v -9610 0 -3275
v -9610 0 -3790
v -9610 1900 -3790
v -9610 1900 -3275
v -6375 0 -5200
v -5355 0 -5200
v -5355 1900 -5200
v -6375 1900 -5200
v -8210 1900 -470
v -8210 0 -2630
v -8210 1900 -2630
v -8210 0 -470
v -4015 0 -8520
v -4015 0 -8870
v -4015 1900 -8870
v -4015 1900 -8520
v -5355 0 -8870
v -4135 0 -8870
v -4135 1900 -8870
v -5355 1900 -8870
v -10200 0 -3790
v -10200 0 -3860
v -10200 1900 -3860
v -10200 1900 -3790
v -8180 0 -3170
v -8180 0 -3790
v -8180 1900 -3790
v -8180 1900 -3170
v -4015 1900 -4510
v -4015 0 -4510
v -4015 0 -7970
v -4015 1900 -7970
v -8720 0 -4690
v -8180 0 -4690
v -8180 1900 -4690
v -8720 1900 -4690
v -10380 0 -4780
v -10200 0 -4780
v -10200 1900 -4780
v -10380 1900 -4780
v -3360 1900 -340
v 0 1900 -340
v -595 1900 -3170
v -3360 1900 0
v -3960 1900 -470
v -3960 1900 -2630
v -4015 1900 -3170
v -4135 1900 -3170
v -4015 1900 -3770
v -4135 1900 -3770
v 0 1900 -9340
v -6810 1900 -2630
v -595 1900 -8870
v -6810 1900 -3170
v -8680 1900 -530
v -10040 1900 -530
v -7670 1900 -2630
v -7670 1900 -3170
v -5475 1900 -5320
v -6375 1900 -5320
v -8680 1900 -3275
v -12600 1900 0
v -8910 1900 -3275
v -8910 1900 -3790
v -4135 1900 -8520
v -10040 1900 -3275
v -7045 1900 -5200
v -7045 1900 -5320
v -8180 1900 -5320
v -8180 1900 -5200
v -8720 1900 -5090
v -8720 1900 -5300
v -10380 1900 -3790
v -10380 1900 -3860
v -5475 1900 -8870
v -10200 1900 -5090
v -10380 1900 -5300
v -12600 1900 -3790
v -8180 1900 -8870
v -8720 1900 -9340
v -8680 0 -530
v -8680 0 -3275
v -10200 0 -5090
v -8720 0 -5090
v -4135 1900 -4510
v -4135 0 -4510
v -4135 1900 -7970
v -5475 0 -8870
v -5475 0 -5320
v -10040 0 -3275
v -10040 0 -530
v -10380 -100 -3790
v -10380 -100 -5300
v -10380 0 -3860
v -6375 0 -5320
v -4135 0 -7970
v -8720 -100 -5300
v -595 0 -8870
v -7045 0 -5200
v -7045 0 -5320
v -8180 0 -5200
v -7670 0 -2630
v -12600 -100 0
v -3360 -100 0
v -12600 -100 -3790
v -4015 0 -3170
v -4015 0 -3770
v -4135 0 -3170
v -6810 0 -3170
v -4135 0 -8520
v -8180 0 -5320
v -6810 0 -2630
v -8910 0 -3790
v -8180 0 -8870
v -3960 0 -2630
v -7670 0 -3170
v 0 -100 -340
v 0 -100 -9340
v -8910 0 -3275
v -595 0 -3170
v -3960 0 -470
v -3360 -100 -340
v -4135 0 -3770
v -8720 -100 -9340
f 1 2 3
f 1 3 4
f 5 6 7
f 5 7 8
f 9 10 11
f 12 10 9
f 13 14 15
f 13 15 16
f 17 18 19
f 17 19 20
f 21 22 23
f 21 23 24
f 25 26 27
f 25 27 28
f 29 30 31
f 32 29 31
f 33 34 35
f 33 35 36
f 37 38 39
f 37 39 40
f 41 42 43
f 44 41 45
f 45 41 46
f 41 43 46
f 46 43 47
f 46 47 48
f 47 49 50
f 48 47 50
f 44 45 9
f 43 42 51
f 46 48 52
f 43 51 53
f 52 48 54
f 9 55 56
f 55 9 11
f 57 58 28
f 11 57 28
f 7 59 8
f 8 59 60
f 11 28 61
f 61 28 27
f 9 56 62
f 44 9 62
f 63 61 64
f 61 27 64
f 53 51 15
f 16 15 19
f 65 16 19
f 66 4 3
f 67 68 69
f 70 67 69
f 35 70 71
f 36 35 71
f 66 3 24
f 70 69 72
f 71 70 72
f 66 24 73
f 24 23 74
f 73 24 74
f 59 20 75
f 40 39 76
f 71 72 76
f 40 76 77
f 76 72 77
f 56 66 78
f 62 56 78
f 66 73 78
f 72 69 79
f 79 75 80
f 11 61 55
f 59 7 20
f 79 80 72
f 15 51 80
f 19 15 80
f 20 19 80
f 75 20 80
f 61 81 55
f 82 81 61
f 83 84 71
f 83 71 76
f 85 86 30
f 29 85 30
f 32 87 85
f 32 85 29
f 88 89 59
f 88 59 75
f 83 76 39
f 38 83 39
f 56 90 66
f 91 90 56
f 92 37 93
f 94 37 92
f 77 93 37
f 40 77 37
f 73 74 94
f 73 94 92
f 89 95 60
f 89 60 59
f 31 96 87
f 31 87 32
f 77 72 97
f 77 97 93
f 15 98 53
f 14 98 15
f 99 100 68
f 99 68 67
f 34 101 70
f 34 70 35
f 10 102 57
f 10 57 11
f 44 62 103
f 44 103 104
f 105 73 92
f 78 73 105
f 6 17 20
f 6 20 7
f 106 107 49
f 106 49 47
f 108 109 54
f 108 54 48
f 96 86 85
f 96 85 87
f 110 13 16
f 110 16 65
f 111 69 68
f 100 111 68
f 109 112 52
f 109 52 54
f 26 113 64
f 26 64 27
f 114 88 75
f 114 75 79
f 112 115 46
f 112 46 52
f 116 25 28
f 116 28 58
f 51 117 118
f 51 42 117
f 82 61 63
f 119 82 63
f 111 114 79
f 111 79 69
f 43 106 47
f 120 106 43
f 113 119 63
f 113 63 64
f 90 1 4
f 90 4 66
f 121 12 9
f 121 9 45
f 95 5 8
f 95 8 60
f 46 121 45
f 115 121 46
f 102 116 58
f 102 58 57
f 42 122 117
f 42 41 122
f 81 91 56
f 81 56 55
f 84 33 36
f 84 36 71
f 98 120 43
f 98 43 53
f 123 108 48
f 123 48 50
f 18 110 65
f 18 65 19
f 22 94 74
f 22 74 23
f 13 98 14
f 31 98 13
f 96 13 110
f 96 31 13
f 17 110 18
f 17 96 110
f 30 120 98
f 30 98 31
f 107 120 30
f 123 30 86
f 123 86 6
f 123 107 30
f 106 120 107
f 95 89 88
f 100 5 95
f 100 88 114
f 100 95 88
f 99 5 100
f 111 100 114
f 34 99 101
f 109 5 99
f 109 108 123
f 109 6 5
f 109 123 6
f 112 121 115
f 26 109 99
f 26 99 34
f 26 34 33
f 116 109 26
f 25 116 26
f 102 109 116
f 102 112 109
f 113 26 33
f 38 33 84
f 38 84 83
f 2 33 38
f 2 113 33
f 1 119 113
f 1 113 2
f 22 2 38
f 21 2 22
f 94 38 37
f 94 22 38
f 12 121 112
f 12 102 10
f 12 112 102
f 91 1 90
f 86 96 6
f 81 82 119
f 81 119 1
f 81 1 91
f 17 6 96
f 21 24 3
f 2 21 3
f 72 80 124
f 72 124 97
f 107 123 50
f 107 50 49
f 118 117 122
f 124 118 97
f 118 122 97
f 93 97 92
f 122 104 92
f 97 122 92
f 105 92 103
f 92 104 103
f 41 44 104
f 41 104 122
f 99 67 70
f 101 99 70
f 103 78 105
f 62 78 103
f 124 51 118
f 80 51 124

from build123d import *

# Parameters (mm, degrees)
EXTRUDE_1_DEPTH   = 1900
SKETCH_1_W        = 120
SKETCH_1_H        = 3460
EXTRUDE_1_2_DEPTH = 1900
EXTRUDE_2_DEPTH   = 100


with BuildPart() as part:
    # Эскиз1 → Бобышка-Вытянуть1 (new body)
    with BuildSketch(Plane(origin=(0, 0, 0), x_dir=(1, 0, 0), z_dir=(0, 1, 0))):
        Polygon((-12600, 0), (-12600, 3790), (-10380, 3790), (-10380, 3860), (-10200, 3860), (-10200, 3790), (-9610, 3790), (-9610, 3275), (-10040, 3275), (-10040, 530), (-8680, 530), (-8680, 3275), (-8910, 3275), (-8910, 3790), (-8180, 3790), (-8180, 3170), (-7670, 3170), (-7670, 2630), (-8210, 2630), (-8210, 470), (-3960, 470), (-3960, 2630), (-6810, 2630), (-6810, 3170), (-4135, 3170), (-4135, 3770), (-4015, 3770), (-4015, 3170), (-595, 3170), (-595, 8870), (-4015, 8870), (-4015, 8520), (-4135, 8520), (-4135, 8870), (-5355, 8870), (-5355, 5200), (-6375, 5200), (-6375, 5320), (-5475, 5320), (-5475, 8870), (-8180, 8870), (-8180, 5320), (-7045, 5320), (-7045, 5200), (-8180, 5200), (-8180, 4690), (-8720, 4690), (-8720, 5090), (-10200, 5090), (-10200, 4780), (-10380, 4780), (-10380, 5300), (-8720, 5300), (-8720, 9340), (0, 9340), (0, 2250), (0, 340), (-3360, 340), (-3360, 0), align=None)
    extrude(amount=EXTRUDE_1_DEPTH)



with BuildPart() as body_2:
    # Эскиз1 → Extrude 1 2 (new body)
    with BuildSketch(Plane(origin=(0, 0, 0), x_dir=(1, 0, 0), z_dir=(0, 1, 0))):
        with Locations((-4075, 6240)):
            Rectangle(SKETCH_1_W, SKETCH_1_H)
    extrude(amount=EXTRUDE_1_2_DEPTH)


with BuildPart() as part_1:
    add(part.part)

    add(body_2.part)  # Бобышка-Вытянуть2 merges body 2
    # Эскиз2 → Бобышка-Вытянуть2 (add)
    with BuildSketch(Plane.XZ):
        Polygon((0, -9340), (-8720, -9340), (-8720, -5300), (-10380, -5300), (-10380, -3790), (-12600, -3790), (-12600, 0), (-3360, 0), (-3360, -340), (0, -340), align=None)
    extrude(amount=EXTRUDE_2_DEPTH)


solid = part_1.part
